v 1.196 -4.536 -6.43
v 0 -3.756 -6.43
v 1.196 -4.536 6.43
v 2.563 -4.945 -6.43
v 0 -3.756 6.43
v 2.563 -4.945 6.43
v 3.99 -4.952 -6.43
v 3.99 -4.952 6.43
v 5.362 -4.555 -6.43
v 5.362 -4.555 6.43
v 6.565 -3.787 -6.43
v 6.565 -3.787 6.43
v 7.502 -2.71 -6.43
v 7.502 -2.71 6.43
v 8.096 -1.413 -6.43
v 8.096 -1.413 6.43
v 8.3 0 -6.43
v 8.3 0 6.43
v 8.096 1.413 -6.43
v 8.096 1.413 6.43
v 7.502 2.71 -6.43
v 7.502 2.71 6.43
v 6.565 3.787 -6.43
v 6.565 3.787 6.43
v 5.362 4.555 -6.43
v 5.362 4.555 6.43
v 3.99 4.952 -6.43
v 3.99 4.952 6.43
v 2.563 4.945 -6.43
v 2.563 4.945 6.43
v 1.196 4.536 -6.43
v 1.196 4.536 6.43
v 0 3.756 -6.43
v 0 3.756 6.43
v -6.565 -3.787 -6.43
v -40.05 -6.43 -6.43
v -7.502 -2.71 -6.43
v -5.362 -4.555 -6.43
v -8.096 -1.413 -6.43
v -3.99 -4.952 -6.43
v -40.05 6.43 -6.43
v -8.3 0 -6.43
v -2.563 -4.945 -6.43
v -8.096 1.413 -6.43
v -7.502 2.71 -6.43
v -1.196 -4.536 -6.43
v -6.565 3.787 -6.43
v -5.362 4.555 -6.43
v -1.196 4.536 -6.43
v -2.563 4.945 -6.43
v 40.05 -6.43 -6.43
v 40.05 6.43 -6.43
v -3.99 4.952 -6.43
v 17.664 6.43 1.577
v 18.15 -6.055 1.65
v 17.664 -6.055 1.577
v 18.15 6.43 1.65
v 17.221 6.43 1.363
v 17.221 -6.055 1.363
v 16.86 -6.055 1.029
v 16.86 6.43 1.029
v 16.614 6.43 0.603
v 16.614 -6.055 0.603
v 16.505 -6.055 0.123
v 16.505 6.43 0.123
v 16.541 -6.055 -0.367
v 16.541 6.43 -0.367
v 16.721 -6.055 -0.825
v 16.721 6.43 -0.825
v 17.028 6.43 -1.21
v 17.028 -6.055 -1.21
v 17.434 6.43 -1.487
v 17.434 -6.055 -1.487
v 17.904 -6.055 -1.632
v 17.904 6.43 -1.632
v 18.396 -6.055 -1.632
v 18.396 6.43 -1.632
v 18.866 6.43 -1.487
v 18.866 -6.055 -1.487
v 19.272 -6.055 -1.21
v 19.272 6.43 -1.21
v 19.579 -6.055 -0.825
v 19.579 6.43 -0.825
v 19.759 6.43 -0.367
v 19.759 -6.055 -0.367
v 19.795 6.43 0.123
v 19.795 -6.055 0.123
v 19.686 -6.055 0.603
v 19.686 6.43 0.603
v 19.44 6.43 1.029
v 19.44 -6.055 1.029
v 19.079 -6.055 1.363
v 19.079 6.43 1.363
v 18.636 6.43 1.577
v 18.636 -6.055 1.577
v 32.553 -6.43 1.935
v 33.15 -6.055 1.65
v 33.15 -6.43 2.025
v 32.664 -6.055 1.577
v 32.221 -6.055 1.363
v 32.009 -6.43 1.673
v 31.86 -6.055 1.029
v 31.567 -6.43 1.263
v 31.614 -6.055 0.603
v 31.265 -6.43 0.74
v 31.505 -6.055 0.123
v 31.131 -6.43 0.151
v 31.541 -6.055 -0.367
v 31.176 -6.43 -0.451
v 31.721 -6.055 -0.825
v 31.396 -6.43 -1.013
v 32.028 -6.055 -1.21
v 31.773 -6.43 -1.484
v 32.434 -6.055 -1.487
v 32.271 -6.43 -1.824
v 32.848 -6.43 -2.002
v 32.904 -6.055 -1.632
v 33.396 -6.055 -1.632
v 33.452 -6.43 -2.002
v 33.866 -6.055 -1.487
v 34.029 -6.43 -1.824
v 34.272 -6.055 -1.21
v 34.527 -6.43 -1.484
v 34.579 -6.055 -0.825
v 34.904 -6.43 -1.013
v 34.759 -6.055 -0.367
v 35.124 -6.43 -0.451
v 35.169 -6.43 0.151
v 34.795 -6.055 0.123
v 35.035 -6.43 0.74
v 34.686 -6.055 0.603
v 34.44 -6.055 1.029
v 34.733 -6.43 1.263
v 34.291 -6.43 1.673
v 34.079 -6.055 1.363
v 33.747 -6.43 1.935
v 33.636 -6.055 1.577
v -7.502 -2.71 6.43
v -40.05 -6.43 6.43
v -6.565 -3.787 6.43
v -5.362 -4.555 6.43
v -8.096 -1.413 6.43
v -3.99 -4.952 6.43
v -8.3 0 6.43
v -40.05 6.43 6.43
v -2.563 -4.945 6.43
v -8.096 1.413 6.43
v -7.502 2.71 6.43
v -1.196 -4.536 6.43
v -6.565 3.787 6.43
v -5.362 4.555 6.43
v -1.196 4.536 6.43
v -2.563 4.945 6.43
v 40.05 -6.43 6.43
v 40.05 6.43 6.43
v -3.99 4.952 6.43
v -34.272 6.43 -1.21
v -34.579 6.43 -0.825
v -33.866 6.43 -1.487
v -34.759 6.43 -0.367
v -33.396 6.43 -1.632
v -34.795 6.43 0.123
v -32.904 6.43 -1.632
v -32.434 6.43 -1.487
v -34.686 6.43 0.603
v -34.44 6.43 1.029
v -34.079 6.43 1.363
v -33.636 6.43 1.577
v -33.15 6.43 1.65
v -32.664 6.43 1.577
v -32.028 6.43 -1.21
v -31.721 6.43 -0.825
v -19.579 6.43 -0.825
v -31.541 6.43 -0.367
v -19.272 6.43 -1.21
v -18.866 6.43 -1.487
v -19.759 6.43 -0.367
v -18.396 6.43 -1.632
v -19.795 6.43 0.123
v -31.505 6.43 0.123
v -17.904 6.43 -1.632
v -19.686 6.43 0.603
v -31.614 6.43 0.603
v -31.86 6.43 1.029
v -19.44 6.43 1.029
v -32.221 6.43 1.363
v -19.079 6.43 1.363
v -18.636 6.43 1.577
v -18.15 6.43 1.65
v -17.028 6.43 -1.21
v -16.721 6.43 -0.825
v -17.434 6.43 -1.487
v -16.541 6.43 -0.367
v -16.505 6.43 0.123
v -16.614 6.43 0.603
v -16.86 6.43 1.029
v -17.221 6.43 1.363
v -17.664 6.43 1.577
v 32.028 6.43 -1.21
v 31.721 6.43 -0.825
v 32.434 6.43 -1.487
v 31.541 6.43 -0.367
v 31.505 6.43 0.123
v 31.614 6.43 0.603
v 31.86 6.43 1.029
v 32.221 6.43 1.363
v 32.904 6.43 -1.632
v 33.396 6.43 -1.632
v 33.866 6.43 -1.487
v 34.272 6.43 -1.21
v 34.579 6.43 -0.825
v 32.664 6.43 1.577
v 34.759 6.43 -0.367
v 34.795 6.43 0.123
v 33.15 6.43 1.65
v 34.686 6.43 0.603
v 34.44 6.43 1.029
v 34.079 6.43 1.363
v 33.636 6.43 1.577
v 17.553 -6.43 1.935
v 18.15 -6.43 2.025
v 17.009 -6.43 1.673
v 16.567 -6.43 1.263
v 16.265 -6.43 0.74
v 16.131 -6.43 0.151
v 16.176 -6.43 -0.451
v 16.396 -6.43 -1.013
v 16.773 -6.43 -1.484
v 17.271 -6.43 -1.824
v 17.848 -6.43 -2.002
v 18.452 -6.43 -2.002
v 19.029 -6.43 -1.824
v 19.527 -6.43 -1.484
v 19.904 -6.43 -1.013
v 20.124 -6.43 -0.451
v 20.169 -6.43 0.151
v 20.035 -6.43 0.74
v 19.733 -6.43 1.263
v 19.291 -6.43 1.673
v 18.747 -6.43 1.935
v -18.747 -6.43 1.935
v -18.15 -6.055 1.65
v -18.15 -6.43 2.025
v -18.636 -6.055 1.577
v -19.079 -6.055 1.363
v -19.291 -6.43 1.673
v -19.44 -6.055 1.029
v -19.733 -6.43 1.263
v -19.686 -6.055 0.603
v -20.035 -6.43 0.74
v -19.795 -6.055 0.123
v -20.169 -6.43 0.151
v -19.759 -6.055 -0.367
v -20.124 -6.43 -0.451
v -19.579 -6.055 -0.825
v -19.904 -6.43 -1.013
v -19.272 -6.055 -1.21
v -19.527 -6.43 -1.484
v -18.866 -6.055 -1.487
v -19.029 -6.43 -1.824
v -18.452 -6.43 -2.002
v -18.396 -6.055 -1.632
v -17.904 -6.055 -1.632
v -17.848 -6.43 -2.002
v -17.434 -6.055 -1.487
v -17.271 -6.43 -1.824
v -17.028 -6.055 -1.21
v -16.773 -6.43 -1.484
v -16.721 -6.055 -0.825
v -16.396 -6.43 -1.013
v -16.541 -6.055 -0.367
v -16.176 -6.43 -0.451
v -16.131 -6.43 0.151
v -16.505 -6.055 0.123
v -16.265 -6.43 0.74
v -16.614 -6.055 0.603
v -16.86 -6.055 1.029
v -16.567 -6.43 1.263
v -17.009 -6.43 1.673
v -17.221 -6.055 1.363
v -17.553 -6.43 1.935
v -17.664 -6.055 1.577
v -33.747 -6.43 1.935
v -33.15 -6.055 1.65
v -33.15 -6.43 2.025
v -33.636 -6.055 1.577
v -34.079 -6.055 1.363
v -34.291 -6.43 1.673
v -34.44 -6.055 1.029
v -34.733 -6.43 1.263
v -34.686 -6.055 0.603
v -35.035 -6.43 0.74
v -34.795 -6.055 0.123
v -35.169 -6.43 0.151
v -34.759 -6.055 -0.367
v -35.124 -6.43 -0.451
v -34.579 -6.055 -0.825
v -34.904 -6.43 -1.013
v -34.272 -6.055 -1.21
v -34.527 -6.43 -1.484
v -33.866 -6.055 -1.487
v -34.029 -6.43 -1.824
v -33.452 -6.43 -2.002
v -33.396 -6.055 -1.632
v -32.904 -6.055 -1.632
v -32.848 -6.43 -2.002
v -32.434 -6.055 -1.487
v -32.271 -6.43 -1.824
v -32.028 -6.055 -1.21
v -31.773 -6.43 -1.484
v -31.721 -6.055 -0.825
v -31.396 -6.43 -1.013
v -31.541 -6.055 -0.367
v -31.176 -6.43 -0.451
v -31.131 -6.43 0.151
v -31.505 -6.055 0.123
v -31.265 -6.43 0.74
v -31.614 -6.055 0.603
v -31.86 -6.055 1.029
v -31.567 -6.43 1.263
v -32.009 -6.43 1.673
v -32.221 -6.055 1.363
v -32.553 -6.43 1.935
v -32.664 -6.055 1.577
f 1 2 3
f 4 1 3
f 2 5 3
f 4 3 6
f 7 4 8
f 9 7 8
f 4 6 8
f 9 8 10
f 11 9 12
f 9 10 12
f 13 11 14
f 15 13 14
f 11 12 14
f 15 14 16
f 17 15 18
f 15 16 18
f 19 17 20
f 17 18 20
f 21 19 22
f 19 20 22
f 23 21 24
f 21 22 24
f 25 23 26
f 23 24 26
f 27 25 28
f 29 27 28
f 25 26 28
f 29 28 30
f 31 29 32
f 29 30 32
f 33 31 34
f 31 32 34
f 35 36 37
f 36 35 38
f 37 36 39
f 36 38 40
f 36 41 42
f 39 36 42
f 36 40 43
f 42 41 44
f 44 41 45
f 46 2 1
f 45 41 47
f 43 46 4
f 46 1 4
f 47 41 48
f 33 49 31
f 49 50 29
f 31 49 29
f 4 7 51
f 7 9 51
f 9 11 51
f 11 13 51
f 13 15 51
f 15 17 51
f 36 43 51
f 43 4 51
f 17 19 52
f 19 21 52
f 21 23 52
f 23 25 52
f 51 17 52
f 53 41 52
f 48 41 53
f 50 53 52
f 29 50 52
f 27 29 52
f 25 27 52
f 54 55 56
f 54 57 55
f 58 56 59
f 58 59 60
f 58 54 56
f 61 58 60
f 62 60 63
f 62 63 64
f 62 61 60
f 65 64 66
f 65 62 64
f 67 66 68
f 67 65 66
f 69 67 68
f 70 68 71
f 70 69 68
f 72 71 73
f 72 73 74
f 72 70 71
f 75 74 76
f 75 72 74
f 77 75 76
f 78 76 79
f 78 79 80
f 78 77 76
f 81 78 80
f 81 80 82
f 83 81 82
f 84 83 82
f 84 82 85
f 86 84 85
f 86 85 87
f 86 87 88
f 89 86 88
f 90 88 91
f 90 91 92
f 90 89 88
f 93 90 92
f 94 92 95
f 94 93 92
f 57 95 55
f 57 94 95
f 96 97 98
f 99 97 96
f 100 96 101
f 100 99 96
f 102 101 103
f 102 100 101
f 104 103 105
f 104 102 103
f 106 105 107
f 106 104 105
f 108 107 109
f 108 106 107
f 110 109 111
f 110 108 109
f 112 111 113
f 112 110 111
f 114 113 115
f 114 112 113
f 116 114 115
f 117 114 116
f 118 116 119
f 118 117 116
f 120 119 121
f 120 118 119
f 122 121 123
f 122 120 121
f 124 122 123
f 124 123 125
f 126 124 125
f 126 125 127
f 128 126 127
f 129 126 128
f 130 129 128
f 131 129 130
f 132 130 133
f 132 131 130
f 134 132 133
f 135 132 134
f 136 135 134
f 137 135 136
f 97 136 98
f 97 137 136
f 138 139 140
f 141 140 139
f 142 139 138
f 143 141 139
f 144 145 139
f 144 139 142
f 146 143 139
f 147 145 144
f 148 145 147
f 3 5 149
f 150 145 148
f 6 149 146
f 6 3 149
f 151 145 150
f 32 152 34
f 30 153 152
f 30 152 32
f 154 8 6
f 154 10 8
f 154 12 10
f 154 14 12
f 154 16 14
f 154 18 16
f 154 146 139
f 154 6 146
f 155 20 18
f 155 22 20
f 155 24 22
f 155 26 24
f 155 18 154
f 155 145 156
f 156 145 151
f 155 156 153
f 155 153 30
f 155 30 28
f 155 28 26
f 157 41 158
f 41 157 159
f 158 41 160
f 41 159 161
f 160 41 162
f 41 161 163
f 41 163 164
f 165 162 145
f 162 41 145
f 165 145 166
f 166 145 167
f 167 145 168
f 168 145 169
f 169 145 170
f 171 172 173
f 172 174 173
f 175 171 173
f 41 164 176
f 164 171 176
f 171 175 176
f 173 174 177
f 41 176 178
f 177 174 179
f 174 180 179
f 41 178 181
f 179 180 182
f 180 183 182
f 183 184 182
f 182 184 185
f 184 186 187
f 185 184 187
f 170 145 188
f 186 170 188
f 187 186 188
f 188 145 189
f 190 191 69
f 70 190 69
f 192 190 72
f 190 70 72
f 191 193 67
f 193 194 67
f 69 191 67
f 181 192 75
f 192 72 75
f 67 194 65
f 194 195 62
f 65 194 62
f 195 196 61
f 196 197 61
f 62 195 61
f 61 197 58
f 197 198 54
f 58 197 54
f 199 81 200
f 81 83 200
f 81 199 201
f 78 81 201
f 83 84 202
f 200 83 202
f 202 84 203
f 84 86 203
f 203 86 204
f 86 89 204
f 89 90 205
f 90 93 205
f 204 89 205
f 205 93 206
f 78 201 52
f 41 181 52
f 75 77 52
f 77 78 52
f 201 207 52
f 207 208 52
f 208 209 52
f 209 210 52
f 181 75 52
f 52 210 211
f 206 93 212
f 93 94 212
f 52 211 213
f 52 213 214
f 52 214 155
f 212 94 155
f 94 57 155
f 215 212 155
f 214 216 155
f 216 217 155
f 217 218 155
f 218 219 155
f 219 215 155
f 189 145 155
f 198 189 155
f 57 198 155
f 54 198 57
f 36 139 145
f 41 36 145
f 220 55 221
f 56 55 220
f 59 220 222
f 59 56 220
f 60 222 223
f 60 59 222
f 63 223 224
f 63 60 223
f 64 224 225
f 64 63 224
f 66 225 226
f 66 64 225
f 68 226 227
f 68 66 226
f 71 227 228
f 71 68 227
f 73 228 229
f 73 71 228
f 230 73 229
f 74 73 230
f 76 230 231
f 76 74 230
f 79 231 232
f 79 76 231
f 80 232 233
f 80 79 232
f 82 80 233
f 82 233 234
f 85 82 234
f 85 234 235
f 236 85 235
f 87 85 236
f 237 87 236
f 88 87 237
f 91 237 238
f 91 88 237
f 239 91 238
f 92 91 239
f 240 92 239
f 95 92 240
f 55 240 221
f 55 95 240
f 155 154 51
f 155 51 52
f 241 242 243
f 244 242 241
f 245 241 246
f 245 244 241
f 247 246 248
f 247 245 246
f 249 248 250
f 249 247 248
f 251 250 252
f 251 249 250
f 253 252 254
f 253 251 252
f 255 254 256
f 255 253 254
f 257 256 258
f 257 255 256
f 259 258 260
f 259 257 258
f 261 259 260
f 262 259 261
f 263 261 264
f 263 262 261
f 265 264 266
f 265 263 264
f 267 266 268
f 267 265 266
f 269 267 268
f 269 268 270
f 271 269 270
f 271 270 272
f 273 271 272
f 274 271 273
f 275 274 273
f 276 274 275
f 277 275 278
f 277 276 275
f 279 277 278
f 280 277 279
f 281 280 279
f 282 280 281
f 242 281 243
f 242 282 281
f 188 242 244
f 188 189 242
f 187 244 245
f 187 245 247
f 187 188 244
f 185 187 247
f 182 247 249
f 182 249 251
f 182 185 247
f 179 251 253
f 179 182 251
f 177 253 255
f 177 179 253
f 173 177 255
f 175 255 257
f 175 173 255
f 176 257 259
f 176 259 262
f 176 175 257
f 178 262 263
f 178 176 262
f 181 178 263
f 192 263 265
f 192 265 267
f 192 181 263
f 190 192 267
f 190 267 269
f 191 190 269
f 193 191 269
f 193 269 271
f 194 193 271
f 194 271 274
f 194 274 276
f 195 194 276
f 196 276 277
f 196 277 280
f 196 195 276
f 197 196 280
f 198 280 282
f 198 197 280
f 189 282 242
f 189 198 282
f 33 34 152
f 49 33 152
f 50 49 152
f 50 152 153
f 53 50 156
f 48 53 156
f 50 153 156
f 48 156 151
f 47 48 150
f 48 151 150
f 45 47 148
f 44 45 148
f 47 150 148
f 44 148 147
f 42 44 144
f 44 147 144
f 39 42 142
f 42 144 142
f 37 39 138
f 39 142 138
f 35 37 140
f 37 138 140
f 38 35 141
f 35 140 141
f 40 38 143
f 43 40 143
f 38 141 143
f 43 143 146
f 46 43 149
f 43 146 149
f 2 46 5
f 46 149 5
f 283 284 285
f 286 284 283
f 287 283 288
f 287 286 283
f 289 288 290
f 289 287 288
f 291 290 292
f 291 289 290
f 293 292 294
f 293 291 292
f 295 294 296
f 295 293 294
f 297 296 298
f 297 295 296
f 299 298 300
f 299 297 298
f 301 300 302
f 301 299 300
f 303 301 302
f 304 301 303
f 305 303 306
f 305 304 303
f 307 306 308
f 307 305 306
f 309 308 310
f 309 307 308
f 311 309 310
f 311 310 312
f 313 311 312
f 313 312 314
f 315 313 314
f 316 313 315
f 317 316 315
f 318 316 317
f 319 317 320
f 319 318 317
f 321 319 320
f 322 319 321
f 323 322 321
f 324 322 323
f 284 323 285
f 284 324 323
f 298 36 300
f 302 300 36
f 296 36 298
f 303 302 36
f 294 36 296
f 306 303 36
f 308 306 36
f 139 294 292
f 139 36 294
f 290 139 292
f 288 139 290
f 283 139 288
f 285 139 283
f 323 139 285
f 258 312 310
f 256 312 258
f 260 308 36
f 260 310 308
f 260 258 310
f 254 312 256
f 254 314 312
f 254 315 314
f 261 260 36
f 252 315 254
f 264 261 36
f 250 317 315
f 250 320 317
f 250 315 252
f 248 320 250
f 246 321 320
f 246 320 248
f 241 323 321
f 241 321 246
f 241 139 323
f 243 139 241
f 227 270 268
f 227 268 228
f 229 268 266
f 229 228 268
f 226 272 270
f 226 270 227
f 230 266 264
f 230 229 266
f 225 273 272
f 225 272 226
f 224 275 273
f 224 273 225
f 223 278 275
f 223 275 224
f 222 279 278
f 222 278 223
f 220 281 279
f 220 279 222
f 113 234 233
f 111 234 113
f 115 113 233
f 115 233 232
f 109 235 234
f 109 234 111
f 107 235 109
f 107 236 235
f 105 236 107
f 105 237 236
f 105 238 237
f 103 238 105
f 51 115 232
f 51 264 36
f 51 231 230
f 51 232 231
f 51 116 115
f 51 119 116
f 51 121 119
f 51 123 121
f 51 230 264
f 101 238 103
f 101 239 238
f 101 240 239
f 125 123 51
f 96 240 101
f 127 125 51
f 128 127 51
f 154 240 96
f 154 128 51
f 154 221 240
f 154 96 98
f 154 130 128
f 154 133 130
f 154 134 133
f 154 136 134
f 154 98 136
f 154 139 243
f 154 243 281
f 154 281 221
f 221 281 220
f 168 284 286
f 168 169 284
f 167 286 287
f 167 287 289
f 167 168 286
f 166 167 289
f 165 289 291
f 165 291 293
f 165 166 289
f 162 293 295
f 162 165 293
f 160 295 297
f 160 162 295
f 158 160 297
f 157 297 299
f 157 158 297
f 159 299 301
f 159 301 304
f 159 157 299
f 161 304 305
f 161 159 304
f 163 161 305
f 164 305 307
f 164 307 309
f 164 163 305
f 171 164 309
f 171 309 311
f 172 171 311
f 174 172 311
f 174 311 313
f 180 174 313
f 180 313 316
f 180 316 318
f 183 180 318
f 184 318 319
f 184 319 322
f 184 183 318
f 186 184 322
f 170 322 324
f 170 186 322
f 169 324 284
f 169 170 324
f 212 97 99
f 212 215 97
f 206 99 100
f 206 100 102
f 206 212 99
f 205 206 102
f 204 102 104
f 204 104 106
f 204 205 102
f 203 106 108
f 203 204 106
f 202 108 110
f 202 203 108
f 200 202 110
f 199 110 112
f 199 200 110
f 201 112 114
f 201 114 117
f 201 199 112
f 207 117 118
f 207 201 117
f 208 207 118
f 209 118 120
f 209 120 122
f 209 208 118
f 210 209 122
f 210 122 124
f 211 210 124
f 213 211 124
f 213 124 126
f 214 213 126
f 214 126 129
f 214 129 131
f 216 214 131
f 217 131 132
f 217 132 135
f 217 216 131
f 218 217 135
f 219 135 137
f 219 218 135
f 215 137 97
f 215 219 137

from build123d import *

# Parameters (mm, degrees)
IZIM1_W                     = 80.1
IZIM1_H                     = 12.86
Y_KSEKLIK_EKSTR_ZYON2_DEPTH = 6.43
M4_TAPPED_HOLE1_AT_2_COUNT  = 2
M4_TAPPED_HOLE1_AT_2_PITCH  = 15
M4_TAPPED_HOLE1_AT_3_COUNT  = 2
M4_TAPPED_HOLE1_AT_3_PITCH  = 51.3
M4_TAPPED_HOLE1_AT_4_COUNT  = 2
M4_TAPPED_HOLE1_AT_4_PITCH  = 66.3


with BuildPart() as part:
    # Çizim1 → Yükseklik-Ekstrüzyon2 (new body, symmetric)
    with BuildSketch(Plane.XY):
        Rectangle(IZIM1_W, IZIM1_H)
        with BuildLine():
            ThreePointArc((0, 3.756327994), (-8.3, 0), (0, -3.756327994))
            ThreePointArc((0, -3.756327994), (8.3, 0), (0, 3.756327994))
        make_face(mode=Mode.SUBTRACT)
    extrude(amount=Y_KSEKLIK_EKSTR_ZYON2_DEPTH, both=True)

    # Çizim8 → M4 Tapped Hole1 (revolve, cut)
    with BuildSketch(Plane(origin=(-33.15, 6.43, 0), x_dir=(0, 0, 1), z_dir=(1, 0, 0))):
        Polygon((0, 0), (0, 12.86), (2.025, 12.86), (1.65, 12.485), (1.65, 0), align=None)
    m4_tapped_hole1 = revolve(axis=Axis((-33.15, 12.78, 0), (0, -1, 0)), mode=Mode.SUBTRACT)

    # M4 Tapped Hole1 at 2: M4 Tapped Hole1 ×2
    with Locations(*[(i * M4_TAPPED_HOLE1_AT_2_PITCH, 0, 0) for i in range(1, M4_TAPPED_HOLE1_AT_2_COUNT)]):
        add(m4_tapped_hole1, mode=Mode.SUBTRACT)

    # M4 Tapped Hole1 at 3: M4 Tapped Hole1 ×2
    with Locations(*[(i * M4_TAPPED_HOLE1_AT_3_PITCH, 0, 0) for i in range(1, M4_TAPPED_HOLE1_AT_3_COUNT)]):
        add(m4_tapped_hole1, mode=Mode.SUBTRACT)

    # M4 Tapped Hole1 at 4: M4 Tapped Hole1 ×2
    with Locations(*[(i * M4_TAPPED_HOLE1_AT_4_PITCH, 0, 0) for i in range(1, M4_TAPPED_HOLE1_AT_4_COUNT)]):
        add(m4_tapped_hole1, mode=Mode.SUBTRACT)


solid = part.part
